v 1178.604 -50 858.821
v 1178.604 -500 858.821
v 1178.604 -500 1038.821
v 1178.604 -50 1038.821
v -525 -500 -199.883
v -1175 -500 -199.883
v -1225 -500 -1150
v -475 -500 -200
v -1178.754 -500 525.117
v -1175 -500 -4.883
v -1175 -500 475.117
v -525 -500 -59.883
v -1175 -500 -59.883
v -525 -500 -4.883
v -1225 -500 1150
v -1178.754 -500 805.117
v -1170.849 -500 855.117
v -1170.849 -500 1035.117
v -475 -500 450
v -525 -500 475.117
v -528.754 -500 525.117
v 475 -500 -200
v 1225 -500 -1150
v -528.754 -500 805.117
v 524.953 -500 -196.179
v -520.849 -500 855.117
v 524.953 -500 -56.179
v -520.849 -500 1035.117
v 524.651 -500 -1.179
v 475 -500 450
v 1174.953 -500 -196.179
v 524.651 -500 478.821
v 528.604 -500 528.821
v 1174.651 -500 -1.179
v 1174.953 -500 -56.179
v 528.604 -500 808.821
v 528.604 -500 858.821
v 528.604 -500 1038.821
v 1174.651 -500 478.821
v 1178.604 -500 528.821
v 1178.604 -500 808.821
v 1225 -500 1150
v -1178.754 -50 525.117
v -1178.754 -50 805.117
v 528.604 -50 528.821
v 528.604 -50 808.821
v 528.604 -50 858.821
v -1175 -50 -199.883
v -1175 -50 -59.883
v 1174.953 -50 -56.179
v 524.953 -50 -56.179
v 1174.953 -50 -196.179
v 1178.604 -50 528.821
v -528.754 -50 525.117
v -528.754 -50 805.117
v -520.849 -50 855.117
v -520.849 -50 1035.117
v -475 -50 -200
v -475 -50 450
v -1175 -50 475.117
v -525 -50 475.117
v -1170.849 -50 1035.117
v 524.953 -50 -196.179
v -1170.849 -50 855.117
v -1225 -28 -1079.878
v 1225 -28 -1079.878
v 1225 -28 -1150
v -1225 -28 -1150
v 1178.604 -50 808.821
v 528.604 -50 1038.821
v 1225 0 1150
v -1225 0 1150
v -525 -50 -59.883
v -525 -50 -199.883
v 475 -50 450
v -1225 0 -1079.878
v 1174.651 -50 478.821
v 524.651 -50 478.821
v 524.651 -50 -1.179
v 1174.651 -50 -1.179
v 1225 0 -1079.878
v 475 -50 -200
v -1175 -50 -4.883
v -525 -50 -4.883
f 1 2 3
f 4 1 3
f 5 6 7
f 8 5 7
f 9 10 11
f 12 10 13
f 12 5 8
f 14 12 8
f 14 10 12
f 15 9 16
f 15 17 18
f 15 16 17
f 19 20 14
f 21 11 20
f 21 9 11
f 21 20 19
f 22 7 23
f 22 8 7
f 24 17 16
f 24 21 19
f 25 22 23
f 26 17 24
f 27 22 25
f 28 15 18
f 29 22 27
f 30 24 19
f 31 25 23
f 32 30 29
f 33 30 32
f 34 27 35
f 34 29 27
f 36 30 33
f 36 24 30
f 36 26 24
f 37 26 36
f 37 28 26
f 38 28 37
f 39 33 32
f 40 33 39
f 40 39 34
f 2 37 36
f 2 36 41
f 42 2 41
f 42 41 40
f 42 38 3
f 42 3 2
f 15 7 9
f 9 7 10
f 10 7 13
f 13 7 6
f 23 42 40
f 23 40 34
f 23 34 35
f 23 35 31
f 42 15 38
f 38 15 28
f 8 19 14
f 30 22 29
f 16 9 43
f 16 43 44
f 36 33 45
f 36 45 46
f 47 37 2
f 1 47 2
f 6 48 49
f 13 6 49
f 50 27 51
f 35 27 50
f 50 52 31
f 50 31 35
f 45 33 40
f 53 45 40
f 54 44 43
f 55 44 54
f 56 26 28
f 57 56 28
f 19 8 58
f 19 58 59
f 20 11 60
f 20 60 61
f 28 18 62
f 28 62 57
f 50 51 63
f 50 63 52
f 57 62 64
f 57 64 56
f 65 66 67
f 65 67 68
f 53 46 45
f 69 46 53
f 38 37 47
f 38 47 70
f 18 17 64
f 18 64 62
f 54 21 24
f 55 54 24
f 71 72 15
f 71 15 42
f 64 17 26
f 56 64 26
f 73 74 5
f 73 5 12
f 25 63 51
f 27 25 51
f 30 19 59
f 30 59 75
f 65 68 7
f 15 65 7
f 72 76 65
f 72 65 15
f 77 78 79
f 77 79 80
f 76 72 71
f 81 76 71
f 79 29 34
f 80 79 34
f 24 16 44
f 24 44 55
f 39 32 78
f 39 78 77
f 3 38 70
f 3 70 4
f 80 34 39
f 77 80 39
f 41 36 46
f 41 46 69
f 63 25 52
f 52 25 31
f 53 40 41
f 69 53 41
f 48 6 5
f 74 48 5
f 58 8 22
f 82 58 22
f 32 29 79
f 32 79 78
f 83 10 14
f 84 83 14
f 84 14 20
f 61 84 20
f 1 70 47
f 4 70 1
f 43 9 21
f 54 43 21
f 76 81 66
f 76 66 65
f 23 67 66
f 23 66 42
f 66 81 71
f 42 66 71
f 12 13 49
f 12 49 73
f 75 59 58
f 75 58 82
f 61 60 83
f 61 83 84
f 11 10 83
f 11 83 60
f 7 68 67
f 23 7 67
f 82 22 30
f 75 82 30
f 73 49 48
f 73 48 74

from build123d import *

# Parameters (mm, degrees)
F0_W     = 2450
F0_H     = 2300
F1_DEPTH = 500
F2_W     = 2450
F2_H     = 70.1220273972
F3_DEPTH = 28
F4_W     = 950
F4_H     = 650
F5_DEPTH = 450
F6_W     = 650
F6_H     = 180
F6_H_2   = 280
F6_H_3   = 480
F6_H_4   = 140
F7_DEPTH = 450


with BuildPart() as f1:
    # F0 (on Front) → F1 (new body)
    with BuildSketch(Plane.XZ):
        Rectangle(F0_W, F0_H)
    extrude(amount=F1_DEPTH)

    # F2 (on face) → F3 (cut)
    with BuildSketch(Plane(origin=(0, 0, 0), x_dir=(-1, 0, 0), z_dir=(0, 1, 0))):
        with Locations((0, -1114.9389863014)):
            Rectangle(F2_W, F2_H)
    extrude(amount=-F3_DEPTH, mode=Mode.SUBTRACT)

    # F4 (on face) → F5 (cut)
    with BuildSketch(Plane.XZ.offset(500)):
        with Locations((0, 125)):
            Rectangle(F4_W, F4_H)
    extrude(amount=-F5_DEPTH, mode=Mode.SUBTRACT)

    # F6 (on face) → F7 (cut)
    with BuildSketch(Plane.XZ.offset(500)):
        with Locations((-845.8494544029, 945.1172356308)):
            Rectangle(F6_W, F6_H)
        with Locations((-853.7539243698, 665.1172356308)):
            Rectangle(F6_W, F6_H_2)
        with Locations((-850, 235.1172356308)):
            Rectangle(F6_W, F6_H_3)
        with Locations((849.6512174606, 238.820990324)):
            Rectangle(F6_W, F6_H_3)
        with Locations((853.603541851, 668.820990324)):
            Rectangle(F6_W, F6_H_2)
        with Locations((853.603541851, 948.820990324)):
            Rectangle(F6_W, F6_H)
        with Locations((-850, -129.8827643692)):
            Rectangle(F6_W, F6_H_4)
        with Locations((849.9528169632, -126.179009676)):
            Rectangle(F6_W, F6_H_4)
    extrude(amount=-F7_DEPTH, mode=Mode.SUBTRACT)


solid = f1.part
